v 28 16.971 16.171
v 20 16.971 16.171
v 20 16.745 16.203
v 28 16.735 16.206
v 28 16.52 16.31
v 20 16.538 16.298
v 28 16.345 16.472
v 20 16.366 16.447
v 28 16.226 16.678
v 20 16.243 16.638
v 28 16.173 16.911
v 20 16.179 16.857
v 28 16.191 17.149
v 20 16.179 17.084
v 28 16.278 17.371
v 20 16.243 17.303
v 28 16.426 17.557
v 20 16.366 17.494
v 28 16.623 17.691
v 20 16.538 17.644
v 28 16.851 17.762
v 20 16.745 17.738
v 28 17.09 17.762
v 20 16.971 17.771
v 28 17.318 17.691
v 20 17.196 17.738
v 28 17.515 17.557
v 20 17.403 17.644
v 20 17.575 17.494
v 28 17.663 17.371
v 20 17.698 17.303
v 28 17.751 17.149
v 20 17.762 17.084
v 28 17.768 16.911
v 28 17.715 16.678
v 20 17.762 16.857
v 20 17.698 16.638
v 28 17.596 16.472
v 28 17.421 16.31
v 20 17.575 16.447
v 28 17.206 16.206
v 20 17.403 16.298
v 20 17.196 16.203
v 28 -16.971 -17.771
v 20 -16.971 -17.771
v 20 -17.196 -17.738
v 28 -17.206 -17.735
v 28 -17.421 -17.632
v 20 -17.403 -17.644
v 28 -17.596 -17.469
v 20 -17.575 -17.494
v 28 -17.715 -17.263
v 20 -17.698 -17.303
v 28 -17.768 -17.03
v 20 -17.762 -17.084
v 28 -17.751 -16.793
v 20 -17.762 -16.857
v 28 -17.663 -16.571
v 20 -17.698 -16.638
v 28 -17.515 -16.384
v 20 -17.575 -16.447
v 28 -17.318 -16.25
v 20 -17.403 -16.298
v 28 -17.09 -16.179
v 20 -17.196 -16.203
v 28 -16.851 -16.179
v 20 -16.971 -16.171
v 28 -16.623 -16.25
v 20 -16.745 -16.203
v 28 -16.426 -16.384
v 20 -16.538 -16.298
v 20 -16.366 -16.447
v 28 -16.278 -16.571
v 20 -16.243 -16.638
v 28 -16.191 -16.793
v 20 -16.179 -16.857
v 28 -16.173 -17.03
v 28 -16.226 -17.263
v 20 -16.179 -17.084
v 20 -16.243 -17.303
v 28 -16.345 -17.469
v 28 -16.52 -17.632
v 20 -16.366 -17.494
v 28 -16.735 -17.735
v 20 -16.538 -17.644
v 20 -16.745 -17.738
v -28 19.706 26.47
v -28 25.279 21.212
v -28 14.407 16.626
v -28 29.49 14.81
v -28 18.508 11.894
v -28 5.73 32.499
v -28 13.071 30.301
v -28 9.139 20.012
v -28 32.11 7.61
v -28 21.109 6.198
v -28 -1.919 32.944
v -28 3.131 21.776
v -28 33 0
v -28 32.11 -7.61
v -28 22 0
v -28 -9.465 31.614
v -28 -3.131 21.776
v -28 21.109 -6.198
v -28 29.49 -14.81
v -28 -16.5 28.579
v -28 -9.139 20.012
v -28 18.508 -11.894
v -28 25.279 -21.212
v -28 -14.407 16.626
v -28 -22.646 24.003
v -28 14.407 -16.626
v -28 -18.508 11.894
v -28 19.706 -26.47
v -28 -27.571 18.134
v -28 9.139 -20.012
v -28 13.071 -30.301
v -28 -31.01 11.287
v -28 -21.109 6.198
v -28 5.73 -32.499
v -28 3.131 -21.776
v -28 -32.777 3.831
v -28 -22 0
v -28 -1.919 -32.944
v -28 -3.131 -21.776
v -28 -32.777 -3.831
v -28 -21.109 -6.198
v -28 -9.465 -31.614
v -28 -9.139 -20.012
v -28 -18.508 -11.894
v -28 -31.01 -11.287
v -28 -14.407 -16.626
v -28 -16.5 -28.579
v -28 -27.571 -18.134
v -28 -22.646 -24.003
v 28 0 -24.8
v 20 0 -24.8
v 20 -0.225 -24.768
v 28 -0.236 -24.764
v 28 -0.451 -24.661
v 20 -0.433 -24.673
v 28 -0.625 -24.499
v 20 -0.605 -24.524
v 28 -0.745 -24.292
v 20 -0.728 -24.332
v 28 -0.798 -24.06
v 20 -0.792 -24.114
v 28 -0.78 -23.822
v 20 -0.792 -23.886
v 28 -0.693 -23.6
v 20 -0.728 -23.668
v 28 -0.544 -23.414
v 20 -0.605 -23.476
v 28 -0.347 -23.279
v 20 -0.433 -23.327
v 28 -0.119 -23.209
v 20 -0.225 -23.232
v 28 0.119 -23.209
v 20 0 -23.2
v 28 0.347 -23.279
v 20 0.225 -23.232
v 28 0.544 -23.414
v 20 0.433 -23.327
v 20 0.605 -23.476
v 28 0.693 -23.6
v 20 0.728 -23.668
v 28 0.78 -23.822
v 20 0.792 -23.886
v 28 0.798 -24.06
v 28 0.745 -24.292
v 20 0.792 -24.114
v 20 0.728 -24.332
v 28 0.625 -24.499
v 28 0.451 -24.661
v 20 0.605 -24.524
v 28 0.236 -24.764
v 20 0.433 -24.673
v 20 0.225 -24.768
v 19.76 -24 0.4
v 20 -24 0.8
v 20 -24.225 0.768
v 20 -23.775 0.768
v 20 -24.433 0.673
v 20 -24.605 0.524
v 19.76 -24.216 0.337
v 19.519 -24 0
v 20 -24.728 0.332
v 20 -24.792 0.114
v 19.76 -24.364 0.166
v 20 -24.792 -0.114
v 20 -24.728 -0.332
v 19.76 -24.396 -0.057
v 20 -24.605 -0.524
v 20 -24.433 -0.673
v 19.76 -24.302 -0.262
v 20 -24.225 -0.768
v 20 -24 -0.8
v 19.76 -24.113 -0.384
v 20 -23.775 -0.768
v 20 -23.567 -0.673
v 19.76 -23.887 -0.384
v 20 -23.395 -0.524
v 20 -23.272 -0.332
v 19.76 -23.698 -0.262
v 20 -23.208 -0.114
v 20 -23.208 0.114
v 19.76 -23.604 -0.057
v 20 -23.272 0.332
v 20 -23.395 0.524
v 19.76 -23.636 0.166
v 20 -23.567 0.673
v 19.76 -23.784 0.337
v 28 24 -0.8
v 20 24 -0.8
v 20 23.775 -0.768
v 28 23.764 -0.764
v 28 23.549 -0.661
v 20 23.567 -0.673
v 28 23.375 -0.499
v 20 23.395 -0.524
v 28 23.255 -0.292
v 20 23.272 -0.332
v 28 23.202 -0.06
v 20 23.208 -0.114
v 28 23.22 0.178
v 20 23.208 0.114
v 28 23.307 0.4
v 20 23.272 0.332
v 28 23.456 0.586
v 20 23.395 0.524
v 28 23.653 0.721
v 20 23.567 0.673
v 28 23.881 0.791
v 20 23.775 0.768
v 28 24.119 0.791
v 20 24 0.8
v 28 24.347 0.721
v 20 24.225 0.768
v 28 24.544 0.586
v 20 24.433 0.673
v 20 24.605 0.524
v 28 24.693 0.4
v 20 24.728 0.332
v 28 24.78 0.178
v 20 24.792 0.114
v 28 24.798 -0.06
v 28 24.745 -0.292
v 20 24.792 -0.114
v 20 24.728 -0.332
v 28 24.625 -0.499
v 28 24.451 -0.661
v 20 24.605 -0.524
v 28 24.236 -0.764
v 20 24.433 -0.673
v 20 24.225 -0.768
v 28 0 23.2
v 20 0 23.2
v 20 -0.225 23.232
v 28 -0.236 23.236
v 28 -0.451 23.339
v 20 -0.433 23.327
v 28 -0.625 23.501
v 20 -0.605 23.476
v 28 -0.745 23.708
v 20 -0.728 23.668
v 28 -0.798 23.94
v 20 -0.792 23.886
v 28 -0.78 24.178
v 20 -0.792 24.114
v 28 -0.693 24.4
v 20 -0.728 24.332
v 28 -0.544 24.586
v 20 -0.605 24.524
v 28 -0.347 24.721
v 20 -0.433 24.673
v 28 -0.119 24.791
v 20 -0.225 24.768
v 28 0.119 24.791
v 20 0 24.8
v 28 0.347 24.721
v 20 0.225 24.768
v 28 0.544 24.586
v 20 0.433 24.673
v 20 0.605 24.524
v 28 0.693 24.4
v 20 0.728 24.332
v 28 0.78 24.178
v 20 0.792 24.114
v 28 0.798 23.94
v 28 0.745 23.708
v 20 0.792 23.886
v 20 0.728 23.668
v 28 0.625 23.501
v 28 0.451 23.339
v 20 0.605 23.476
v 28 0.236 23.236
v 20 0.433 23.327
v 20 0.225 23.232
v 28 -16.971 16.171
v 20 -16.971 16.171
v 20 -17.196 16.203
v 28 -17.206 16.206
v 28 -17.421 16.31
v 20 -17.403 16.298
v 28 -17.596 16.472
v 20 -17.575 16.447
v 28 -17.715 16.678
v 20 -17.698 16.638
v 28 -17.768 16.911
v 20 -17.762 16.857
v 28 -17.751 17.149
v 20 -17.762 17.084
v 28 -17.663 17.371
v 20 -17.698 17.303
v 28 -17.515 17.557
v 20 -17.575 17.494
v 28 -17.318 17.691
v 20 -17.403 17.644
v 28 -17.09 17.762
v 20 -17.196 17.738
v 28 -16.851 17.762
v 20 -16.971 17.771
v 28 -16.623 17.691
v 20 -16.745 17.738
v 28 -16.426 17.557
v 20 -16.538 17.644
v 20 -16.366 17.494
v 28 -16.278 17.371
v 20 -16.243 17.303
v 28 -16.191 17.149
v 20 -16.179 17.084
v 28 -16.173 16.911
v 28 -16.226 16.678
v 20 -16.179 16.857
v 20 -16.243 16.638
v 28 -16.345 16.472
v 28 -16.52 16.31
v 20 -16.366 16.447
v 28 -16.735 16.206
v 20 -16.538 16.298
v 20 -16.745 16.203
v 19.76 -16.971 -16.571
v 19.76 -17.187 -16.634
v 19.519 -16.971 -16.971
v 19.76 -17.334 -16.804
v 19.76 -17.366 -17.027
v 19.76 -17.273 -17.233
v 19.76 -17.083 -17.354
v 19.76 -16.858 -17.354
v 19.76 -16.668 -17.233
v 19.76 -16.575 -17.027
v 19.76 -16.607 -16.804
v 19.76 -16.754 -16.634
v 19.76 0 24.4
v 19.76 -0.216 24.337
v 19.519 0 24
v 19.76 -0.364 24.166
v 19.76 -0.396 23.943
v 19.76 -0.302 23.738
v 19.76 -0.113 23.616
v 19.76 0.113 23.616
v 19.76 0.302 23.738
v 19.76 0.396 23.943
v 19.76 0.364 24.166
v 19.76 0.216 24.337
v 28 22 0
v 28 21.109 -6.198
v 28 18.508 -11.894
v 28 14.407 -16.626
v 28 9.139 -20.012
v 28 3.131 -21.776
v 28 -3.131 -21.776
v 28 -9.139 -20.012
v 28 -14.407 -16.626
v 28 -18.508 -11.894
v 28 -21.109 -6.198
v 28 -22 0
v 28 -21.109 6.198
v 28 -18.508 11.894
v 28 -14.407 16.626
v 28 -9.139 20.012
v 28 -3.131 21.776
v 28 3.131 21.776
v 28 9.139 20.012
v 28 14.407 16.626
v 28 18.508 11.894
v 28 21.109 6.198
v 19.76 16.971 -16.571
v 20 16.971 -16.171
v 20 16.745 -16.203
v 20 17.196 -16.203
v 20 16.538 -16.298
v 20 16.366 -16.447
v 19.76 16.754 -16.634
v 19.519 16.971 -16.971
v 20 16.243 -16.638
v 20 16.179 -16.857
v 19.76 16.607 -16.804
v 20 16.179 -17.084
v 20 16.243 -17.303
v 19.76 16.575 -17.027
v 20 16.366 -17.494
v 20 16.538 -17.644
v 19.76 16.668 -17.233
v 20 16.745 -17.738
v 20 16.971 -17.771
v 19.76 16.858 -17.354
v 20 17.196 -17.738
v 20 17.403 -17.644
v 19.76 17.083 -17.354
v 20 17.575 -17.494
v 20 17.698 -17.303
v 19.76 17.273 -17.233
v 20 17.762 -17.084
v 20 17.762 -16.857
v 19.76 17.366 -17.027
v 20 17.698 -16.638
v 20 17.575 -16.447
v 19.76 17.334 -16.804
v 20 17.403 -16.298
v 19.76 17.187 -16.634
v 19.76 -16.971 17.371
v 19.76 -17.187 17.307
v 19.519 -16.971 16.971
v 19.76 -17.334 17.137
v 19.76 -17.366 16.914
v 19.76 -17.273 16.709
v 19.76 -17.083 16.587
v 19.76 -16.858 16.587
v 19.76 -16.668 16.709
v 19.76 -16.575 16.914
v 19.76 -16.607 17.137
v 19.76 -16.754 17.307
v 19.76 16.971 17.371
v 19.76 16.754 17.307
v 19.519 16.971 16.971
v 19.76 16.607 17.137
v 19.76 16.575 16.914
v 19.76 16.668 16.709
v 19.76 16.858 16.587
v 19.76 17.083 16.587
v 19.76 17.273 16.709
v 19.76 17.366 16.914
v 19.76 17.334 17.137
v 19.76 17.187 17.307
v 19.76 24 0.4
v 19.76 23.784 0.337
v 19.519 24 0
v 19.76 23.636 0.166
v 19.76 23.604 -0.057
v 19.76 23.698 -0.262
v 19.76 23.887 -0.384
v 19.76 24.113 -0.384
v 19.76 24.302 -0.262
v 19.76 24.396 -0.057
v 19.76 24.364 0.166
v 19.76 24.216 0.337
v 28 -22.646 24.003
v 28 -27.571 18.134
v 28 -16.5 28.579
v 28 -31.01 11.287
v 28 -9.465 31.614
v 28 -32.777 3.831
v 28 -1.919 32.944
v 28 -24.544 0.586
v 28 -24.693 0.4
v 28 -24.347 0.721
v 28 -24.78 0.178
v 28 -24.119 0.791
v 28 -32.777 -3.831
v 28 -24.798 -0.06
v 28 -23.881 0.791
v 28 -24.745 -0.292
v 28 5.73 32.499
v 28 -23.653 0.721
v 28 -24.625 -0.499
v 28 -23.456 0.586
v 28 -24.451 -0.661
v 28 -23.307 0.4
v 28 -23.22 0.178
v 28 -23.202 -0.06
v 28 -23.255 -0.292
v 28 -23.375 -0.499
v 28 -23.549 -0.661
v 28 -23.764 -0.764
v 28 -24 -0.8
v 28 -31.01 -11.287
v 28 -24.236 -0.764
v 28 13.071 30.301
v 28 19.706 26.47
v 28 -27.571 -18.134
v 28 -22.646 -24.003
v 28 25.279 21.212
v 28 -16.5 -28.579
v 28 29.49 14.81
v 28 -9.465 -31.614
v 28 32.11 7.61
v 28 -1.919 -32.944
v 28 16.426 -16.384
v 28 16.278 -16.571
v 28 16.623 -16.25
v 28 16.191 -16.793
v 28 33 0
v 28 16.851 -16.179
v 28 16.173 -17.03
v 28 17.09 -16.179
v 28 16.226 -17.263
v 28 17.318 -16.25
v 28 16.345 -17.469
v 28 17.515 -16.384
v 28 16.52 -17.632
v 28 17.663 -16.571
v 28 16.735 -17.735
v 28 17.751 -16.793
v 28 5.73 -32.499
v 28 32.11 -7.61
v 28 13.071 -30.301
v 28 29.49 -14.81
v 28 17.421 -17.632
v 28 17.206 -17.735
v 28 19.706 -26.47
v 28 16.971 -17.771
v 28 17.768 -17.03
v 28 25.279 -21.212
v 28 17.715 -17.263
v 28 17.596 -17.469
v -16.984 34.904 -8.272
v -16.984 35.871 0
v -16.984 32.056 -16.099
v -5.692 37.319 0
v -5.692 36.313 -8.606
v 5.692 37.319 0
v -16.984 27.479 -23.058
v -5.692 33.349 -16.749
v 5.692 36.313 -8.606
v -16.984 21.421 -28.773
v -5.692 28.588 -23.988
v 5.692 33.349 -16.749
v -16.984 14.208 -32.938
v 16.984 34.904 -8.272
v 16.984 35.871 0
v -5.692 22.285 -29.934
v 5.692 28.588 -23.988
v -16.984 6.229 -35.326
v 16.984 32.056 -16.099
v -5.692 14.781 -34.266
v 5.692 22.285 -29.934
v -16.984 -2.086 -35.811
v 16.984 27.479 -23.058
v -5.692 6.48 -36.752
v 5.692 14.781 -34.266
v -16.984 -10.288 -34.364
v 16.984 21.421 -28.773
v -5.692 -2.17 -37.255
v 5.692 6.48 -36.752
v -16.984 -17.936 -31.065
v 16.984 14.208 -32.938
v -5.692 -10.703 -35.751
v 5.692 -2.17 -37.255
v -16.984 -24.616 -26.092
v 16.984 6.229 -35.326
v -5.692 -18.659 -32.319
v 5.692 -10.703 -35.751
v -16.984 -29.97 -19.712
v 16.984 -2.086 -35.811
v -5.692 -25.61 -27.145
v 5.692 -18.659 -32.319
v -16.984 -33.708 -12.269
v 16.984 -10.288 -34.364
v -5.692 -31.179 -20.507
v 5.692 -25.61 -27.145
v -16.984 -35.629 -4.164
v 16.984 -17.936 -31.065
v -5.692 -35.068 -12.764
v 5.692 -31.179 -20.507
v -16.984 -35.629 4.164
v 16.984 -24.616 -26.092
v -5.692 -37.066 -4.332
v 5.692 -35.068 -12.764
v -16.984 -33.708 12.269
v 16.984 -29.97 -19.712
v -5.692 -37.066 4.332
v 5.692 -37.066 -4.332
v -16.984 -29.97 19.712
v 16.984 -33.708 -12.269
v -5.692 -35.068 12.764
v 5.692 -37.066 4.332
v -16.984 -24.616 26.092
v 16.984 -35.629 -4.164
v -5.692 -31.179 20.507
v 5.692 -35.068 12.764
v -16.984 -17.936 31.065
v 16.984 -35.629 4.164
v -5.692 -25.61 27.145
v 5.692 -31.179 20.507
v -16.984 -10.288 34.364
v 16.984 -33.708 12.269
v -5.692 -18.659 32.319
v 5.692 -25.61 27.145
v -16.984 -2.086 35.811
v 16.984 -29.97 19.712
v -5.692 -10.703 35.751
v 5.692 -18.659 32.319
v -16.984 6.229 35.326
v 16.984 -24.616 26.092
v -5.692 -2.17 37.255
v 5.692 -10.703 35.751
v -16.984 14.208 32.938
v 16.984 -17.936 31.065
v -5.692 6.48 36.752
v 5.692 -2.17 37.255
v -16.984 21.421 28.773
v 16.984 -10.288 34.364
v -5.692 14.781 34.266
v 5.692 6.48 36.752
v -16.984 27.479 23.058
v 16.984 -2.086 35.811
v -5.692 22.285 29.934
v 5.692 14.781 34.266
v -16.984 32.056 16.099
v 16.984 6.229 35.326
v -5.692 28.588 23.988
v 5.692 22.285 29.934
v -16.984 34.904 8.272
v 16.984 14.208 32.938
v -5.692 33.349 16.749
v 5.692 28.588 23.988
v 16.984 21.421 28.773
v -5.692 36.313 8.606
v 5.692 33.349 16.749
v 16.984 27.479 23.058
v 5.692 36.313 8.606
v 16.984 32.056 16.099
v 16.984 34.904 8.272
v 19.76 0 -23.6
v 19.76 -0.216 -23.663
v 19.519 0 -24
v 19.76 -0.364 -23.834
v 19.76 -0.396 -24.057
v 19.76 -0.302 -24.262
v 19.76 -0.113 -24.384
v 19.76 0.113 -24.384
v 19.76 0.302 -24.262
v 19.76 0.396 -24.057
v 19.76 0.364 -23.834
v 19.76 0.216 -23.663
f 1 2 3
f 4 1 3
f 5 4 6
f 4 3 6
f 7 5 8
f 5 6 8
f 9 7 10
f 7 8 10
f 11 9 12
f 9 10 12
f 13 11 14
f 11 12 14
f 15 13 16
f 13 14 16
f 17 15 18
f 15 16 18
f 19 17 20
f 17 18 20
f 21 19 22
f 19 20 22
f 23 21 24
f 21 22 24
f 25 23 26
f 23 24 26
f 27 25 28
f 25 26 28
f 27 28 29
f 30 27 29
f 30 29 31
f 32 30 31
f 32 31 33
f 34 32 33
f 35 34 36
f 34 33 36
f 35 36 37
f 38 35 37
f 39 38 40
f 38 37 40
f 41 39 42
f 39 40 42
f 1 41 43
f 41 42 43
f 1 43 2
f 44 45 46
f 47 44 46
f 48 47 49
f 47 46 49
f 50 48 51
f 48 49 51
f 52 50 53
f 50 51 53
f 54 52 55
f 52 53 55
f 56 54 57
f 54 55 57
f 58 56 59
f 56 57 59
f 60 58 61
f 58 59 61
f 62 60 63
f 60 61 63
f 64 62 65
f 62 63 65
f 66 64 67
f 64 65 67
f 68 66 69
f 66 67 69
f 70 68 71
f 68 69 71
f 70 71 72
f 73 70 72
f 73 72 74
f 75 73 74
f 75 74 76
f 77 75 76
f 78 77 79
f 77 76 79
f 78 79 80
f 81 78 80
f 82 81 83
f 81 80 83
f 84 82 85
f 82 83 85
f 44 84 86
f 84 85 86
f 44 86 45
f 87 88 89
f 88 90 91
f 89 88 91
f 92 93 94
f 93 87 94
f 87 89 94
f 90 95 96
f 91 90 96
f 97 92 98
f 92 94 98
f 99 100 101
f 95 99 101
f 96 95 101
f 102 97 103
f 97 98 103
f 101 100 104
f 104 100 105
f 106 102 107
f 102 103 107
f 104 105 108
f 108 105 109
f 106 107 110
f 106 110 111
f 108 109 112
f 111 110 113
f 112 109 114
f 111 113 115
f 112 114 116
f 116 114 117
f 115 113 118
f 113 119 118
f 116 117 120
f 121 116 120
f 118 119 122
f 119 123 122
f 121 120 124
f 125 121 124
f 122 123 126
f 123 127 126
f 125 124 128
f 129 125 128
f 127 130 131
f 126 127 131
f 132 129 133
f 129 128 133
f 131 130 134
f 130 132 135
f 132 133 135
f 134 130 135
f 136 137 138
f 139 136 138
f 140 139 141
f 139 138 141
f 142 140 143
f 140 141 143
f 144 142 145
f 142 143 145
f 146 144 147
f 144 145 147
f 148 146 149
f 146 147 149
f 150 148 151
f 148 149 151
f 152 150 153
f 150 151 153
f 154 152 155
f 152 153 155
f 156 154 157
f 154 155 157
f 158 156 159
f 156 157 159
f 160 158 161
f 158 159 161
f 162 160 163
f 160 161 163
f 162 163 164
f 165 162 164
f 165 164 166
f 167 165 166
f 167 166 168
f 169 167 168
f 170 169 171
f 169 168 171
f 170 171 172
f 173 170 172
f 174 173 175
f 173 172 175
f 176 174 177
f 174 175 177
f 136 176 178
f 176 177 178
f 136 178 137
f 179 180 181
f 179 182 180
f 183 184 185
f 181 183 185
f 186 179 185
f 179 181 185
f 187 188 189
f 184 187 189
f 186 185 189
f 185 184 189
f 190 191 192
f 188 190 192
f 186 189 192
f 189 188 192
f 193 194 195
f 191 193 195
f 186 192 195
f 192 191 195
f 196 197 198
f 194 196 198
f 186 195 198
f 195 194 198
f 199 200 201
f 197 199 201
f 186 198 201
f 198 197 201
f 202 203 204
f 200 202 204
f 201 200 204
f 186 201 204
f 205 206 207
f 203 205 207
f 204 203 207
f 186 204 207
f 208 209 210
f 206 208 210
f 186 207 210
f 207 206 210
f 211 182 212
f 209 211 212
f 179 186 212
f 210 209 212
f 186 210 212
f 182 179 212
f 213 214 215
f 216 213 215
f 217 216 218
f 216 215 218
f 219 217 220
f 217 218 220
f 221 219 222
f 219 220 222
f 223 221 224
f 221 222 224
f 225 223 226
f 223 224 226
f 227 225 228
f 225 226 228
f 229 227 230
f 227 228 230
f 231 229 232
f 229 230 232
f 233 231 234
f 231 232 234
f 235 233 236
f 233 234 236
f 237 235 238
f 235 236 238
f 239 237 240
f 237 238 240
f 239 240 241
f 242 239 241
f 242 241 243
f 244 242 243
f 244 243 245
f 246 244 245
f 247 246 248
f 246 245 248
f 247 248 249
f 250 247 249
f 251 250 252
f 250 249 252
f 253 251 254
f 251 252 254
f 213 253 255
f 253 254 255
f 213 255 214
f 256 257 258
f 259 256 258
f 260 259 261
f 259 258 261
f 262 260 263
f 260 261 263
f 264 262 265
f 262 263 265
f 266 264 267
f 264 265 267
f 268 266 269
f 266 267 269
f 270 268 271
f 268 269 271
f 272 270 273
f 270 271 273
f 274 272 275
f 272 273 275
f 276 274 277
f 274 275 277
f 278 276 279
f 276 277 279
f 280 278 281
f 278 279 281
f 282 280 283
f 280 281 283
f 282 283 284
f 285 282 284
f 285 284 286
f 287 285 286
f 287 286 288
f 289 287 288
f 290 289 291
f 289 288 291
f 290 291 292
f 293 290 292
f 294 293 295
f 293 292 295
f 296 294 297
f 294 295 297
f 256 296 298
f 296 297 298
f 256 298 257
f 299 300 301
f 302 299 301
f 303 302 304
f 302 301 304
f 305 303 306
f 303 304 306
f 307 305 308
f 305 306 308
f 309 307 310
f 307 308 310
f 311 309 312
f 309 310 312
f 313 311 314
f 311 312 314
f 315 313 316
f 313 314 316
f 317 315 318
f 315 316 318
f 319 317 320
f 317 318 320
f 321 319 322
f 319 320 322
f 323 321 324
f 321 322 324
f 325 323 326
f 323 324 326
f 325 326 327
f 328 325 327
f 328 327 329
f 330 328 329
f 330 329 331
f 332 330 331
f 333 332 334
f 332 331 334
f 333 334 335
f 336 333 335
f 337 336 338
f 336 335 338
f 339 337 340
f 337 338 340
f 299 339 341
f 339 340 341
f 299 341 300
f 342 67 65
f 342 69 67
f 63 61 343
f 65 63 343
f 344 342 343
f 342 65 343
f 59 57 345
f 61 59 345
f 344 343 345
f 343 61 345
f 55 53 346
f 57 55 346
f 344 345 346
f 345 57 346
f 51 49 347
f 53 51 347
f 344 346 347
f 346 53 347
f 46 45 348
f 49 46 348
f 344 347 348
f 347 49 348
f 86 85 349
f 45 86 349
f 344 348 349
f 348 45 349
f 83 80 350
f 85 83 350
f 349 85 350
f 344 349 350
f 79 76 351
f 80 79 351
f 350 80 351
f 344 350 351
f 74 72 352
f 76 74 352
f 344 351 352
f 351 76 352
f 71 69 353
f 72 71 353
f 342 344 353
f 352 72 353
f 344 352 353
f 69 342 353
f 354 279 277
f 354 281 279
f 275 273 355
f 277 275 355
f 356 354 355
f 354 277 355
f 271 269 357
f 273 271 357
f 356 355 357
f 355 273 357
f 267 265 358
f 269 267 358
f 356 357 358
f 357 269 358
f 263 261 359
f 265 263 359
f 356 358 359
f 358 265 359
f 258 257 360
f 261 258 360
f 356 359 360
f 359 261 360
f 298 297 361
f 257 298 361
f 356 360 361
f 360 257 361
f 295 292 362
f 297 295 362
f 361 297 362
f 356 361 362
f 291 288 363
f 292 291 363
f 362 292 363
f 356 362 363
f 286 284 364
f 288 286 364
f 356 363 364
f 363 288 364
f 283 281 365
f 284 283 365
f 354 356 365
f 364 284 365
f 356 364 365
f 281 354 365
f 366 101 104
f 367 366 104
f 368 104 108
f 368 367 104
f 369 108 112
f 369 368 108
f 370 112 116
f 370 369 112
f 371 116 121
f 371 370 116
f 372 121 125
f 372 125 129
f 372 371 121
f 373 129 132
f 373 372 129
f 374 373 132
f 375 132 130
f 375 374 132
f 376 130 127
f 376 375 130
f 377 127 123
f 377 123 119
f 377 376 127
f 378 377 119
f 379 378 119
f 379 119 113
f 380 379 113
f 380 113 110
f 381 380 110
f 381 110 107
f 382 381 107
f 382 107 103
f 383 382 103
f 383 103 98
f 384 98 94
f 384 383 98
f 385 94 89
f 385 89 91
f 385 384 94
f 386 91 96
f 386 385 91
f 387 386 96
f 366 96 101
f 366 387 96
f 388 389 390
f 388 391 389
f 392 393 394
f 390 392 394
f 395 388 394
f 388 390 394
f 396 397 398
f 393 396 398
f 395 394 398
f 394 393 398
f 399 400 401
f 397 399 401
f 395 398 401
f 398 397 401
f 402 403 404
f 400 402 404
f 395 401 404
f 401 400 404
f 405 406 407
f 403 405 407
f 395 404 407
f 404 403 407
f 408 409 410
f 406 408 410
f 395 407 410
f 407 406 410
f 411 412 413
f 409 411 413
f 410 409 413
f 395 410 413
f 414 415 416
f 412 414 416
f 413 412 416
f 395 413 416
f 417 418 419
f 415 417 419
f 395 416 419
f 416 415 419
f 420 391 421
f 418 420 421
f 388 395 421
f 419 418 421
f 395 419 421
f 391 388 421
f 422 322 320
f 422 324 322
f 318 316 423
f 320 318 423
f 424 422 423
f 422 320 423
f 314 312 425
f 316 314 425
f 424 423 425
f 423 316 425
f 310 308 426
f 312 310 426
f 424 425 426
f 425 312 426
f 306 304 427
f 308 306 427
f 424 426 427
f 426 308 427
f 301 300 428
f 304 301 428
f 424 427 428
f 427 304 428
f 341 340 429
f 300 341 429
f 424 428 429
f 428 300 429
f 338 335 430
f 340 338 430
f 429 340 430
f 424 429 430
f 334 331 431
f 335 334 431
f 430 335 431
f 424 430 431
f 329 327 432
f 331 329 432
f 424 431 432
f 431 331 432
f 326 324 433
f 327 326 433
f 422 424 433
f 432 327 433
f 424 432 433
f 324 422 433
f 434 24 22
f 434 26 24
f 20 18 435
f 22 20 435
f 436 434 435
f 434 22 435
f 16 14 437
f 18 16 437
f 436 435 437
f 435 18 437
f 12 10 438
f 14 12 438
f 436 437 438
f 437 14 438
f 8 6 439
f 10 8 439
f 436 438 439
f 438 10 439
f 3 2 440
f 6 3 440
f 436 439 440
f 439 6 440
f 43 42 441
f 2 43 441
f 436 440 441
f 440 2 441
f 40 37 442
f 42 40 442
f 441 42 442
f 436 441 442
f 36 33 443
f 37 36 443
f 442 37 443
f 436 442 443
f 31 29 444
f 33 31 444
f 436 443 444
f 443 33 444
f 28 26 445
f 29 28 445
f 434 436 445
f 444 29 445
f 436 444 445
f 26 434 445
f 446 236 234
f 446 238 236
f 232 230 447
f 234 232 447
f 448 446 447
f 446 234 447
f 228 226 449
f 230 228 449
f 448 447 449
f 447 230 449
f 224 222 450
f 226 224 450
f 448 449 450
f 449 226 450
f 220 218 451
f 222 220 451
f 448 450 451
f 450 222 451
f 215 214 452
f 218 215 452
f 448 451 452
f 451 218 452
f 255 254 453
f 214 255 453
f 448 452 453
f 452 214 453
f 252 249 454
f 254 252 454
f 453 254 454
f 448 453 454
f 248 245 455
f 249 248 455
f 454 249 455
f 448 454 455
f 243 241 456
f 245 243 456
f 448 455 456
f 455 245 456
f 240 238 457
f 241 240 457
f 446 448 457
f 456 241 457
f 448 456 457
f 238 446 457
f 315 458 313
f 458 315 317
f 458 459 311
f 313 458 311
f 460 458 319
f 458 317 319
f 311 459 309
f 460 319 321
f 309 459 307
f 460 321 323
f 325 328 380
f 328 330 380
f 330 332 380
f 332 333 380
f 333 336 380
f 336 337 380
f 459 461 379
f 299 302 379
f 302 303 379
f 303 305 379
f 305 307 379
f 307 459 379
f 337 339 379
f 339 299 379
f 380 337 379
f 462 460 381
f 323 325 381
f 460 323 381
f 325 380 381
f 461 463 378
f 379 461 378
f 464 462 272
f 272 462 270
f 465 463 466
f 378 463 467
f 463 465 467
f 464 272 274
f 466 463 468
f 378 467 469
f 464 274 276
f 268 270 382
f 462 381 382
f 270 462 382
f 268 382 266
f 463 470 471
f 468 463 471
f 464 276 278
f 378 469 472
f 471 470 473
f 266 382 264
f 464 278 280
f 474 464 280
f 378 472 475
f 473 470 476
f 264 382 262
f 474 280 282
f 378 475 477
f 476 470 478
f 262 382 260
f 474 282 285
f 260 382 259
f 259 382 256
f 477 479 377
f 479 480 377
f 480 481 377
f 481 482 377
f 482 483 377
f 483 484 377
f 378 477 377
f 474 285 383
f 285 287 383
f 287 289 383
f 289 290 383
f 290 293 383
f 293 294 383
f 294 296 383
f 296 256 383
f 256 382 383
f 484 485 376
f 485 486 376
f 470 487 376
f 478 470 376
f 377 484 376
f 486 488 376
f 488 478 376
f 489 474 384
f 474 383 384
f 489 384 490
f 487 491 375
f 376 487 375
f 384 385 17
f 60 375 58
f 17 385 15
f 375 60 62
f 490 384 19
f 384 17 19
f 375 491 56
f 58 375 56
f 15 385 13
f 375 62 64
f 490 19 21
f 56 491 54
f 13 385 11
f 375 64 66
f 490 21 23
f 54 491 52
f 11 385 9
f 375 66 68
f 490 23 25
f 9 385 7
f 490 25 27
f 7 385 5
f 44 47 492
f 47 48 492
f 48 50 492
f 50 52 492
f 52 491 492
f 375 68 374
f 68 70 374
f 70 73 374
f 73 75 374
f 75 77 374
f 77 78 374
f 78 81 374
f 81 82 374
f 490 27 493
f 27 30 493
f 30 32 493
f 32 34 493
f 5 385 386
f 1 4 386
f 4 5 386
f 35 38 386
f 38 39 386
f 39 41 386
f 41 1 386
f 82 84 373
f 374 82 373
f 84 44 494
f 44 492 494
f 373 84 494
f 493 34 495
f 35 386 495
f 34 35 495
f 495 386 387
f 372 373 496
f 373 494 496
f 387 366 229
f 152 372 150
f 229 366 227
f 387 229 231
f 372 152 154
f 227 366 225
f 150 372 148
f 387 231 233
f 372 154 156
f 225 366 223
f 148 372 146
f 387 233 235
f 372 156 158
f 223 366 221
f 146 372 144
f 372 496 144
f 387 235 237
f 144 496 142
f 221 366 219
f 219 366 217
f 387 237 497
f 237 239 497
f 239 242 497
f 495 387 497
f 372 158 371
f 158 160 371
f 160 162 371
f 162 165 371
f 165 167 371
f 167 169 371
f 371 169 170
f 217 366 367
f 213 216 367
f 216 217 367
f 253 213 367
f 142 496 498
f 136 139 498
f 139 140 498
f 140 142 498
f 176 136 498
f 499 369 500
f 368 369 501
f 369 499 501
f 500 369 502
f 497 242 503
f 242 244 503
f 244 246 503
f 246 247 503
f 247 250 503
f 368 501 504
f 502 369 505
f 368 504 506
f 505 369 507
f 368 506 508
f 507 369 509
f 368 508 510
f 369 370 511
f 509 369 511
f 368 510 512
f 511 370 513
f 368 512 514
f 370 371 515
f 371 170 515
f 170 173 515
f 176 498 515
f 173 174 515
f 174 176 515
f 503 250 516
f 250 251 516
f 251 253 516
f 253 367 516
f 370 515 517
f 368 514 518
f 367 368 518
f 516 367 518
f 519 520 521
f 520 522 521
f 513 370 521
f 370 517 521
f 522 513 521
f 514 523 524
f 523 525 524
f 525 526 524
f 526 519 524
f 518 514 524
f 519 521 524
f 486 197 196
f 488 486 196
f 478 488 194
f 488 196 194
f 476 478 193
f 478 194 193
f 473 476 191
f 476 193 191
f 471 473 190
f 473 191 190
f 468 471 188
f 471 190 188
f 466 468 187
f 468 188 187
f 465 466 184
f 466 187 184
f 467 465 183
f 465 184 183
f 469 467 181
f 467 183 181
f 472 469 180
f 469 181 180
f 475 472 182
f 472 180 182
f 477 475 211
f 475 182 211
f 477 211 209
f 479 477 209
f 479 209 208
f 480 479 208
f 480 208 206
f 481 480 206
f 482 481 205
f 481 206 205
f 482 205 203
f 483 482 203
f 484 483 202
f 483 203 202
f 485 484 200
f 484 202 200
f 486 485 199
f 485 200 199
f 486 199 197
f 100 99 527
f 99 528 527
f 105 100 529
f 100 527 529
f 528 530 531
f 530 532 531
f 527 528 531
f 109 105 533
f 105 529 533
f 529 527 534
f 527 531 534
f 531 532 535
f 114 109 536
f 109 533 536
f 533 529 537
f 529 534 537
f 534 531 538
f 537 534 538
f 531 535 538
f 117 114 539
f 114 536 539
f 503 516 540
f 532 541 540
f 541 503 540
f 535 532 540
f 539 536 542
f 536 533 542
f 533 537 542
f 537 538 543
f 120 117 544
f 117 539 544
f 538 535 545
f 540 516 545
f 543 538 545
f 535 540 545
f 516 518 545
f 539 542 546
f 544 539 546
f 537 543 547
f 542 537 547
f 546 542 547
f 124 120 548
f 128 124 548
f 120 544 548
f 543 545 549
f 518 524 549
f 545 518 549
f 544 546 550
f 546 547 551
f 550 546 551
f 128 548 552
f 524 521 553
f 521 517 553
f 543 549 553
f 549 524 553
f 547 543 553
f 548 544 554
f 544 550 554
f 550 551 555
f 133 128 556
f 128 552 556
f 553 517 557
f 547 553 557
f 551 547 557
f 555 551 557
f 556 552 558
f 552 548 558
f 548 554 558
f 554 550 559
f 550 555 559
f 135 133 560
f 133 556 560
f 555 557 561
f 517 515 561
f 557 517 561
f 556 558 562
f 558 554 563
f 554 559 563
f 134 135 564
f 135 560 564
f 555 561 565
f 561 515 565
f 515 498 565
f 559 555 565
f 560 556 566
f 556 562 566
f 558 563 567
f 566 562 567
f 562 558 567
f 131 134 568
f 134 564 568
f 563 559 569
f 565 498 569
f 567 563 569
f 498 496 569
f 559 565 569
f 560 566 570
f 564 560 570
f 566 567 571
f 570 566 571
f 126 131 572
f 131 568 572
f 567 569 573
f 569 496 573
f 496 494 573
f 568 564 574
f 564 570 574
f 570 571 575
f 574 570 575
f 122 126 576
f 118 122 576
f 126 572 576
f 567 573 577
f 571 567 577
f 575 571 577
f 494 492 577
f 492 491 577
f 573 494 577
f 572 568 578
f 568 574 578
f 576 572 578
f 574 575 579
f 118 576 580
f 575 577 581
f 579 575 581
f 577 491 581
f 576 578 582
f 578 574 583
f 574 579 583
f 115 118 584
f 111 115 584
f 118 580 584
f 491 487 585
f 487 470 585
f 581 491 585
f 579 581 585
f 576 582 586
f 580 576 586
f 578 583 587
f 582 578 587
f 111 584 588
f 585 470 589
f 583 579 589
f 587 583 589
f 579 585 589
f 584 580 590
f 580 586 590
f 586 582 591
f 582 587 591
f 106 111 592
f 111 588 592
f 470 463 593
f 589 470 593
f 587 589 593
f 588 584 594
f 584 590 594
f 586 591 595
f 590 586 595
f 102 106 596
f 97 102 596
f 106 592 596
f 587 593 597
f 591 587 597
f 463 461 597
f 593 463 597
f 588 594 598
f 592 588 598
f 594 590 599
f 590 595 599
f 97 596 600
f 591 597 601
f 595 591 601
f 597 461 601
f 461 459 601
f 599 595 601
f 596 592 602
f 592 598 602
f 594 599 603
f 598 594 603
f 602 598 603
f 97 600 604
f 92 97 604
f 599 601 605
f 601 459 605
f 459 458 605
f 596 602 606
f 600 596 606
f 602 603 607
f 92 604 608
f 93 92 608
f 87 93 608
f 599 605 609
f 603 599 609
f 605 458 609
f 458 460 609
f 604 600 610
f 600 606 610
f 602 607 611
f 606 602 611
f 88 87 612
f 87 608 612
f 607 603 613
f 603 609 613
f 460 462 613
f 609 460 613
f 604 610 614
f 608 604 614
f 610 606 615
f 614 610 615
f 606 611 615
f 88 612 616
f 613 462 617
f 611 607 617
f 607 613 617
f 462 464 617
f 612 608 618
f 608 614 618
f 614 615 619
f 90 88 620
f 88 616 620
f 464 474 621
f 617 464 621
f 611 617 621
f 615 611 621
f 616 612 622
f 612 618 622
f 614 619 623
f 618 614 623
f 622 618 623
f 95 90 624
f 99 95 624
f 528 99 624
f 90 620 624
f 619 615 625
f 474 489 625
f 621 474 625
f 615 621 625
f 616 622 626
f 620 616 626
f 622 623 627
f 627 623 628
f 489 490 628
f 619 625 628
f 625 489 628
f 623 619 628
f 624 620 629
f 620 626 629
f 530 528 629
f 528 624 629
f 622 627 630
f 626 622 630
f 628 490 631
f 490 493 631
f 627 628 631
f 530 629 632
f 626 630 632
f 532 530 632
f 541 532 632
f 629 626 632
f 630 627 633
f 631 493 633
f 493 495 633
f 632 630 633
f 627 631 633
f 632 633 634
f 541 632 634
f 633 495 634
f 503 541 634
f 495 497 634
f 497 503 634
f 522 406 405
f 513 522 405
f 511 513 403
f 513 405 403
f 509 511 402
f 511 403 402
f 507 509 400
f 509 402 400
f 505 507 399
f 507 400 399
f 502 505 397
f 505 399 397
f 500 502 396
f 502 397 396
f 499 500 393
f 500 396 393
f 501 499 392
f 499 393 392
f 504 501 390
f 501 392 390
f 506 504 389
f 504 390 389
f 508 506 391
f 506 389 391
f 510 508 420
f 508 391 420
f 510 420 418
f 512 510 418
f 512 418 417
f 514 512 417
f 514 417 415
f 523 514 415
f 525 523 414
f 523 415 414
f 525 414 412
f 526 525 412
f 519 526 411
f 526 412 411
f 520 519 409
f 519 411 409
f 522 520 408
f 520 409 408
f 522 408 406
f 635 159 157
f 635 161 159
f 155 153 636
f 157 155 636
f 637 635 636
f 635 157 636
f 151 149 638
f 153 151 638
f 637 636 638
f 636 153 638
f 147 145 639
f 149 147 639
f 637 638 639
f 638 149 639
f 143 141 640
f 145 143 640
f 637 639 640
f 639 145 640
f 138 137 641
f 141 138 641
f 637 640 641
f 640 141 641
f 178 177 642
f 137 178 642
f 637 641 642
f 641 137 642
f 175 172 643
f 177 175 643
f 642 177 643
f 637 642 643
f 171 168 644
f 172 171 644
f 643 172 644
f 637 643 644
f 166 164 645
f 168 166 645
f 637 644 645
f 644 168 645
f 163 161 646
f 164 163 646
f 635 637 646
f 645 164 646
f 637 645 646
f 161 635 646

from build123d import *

# Parameters (mm, degrees)
FORMSENKUNG_F_R_M3_SENKSCHRAUBE_MIT_INNE_D           = 1.6
FORMSENKUNG_F_R_M3_SENKSCHRAUBE_MIT_INNE_DEPTH       = 12.5
FORMSENKUNG_F_R_M3_SENKSCHRAUBE_MIT_INNE_CSINK_D     = 3.75
FORMSENKUNG_F_R_M3_SENKSCHRAUBE_MIT_INNE_CSINK_ANGLE = 90
FORMSENKUNG_F_R_M3_SENKSCHRAUBE_MIT_INNE_TIP         = 0.480688495


with BuildPart() as part:
    # Skizze1 → Rotation1 (revolve)
    with BuildSketch(Plane.XY):
        with BuildLine():
            Line((28, 22), (28, 33))
            ThreePointArc((28, 33), (0, 37.5), (-28, 33))
            Line((-28, 33), (-28, 22))
            Line((-28, 22), (28, 22))
        make_face()
    revolve(axis=Axis((0, 0, 0), (-1, 0, 0)))

    # Formsenkung für M3 Senkschraube mit Innensechskant2
    with Locations(Plane(origin=(32.5, -4.747521164, 0), x_dir=(0, 0, 1), z_dir=(1, 0, 0))):
        with Locations((0, -28.747521164), (16.970562748, -21.718083913), (24, -4.747521164), (16.970562748, 12.223041584), (0, 19.252478836), (-16.970562748, 12.223041584), (-24, -4.747521164), (-16.970562748, -21.718083913), (0, -4.747521164)):
            CounterSinkHole(FORMSENKUNG_F_R_M3_SENKSCHRAUBE_MIT_INNE_D / 2, FORMSENKUNG_F_R_M3_SENKSCHRAUBE_MIT_INNE_CSINK_D / 2, depth=FORMSENKUNG_F_R_M3_SENKSCHRAUBE_MIT_INNE_DEPTH, counter_sink_angle=FORMSENKUNG_F_R_M3_SENKSCHRAUBE_MIT_INNE_CSINK_ANGLE)
            with Locations((0, 0, -(FORMSENKUNG_F_R_M3_SENKSCHRAUBE_MIT_INNE_DEPTH + FORMSENKUNG_F_R_M3_SENKSCHRAUBE_MIT_INNE_TIP / 2))):  # 118° drill point
                Cone(0, FORMSENKUNG_F_R_M3_SENKSCHRAUBE_MIT_INNE_D / 2, FORMSENKUNG_F_R_M3_SENKSCHRAUBE_MIT_INNE_TIP, mode=Mode.SUBTRACT)


solid = part.part
